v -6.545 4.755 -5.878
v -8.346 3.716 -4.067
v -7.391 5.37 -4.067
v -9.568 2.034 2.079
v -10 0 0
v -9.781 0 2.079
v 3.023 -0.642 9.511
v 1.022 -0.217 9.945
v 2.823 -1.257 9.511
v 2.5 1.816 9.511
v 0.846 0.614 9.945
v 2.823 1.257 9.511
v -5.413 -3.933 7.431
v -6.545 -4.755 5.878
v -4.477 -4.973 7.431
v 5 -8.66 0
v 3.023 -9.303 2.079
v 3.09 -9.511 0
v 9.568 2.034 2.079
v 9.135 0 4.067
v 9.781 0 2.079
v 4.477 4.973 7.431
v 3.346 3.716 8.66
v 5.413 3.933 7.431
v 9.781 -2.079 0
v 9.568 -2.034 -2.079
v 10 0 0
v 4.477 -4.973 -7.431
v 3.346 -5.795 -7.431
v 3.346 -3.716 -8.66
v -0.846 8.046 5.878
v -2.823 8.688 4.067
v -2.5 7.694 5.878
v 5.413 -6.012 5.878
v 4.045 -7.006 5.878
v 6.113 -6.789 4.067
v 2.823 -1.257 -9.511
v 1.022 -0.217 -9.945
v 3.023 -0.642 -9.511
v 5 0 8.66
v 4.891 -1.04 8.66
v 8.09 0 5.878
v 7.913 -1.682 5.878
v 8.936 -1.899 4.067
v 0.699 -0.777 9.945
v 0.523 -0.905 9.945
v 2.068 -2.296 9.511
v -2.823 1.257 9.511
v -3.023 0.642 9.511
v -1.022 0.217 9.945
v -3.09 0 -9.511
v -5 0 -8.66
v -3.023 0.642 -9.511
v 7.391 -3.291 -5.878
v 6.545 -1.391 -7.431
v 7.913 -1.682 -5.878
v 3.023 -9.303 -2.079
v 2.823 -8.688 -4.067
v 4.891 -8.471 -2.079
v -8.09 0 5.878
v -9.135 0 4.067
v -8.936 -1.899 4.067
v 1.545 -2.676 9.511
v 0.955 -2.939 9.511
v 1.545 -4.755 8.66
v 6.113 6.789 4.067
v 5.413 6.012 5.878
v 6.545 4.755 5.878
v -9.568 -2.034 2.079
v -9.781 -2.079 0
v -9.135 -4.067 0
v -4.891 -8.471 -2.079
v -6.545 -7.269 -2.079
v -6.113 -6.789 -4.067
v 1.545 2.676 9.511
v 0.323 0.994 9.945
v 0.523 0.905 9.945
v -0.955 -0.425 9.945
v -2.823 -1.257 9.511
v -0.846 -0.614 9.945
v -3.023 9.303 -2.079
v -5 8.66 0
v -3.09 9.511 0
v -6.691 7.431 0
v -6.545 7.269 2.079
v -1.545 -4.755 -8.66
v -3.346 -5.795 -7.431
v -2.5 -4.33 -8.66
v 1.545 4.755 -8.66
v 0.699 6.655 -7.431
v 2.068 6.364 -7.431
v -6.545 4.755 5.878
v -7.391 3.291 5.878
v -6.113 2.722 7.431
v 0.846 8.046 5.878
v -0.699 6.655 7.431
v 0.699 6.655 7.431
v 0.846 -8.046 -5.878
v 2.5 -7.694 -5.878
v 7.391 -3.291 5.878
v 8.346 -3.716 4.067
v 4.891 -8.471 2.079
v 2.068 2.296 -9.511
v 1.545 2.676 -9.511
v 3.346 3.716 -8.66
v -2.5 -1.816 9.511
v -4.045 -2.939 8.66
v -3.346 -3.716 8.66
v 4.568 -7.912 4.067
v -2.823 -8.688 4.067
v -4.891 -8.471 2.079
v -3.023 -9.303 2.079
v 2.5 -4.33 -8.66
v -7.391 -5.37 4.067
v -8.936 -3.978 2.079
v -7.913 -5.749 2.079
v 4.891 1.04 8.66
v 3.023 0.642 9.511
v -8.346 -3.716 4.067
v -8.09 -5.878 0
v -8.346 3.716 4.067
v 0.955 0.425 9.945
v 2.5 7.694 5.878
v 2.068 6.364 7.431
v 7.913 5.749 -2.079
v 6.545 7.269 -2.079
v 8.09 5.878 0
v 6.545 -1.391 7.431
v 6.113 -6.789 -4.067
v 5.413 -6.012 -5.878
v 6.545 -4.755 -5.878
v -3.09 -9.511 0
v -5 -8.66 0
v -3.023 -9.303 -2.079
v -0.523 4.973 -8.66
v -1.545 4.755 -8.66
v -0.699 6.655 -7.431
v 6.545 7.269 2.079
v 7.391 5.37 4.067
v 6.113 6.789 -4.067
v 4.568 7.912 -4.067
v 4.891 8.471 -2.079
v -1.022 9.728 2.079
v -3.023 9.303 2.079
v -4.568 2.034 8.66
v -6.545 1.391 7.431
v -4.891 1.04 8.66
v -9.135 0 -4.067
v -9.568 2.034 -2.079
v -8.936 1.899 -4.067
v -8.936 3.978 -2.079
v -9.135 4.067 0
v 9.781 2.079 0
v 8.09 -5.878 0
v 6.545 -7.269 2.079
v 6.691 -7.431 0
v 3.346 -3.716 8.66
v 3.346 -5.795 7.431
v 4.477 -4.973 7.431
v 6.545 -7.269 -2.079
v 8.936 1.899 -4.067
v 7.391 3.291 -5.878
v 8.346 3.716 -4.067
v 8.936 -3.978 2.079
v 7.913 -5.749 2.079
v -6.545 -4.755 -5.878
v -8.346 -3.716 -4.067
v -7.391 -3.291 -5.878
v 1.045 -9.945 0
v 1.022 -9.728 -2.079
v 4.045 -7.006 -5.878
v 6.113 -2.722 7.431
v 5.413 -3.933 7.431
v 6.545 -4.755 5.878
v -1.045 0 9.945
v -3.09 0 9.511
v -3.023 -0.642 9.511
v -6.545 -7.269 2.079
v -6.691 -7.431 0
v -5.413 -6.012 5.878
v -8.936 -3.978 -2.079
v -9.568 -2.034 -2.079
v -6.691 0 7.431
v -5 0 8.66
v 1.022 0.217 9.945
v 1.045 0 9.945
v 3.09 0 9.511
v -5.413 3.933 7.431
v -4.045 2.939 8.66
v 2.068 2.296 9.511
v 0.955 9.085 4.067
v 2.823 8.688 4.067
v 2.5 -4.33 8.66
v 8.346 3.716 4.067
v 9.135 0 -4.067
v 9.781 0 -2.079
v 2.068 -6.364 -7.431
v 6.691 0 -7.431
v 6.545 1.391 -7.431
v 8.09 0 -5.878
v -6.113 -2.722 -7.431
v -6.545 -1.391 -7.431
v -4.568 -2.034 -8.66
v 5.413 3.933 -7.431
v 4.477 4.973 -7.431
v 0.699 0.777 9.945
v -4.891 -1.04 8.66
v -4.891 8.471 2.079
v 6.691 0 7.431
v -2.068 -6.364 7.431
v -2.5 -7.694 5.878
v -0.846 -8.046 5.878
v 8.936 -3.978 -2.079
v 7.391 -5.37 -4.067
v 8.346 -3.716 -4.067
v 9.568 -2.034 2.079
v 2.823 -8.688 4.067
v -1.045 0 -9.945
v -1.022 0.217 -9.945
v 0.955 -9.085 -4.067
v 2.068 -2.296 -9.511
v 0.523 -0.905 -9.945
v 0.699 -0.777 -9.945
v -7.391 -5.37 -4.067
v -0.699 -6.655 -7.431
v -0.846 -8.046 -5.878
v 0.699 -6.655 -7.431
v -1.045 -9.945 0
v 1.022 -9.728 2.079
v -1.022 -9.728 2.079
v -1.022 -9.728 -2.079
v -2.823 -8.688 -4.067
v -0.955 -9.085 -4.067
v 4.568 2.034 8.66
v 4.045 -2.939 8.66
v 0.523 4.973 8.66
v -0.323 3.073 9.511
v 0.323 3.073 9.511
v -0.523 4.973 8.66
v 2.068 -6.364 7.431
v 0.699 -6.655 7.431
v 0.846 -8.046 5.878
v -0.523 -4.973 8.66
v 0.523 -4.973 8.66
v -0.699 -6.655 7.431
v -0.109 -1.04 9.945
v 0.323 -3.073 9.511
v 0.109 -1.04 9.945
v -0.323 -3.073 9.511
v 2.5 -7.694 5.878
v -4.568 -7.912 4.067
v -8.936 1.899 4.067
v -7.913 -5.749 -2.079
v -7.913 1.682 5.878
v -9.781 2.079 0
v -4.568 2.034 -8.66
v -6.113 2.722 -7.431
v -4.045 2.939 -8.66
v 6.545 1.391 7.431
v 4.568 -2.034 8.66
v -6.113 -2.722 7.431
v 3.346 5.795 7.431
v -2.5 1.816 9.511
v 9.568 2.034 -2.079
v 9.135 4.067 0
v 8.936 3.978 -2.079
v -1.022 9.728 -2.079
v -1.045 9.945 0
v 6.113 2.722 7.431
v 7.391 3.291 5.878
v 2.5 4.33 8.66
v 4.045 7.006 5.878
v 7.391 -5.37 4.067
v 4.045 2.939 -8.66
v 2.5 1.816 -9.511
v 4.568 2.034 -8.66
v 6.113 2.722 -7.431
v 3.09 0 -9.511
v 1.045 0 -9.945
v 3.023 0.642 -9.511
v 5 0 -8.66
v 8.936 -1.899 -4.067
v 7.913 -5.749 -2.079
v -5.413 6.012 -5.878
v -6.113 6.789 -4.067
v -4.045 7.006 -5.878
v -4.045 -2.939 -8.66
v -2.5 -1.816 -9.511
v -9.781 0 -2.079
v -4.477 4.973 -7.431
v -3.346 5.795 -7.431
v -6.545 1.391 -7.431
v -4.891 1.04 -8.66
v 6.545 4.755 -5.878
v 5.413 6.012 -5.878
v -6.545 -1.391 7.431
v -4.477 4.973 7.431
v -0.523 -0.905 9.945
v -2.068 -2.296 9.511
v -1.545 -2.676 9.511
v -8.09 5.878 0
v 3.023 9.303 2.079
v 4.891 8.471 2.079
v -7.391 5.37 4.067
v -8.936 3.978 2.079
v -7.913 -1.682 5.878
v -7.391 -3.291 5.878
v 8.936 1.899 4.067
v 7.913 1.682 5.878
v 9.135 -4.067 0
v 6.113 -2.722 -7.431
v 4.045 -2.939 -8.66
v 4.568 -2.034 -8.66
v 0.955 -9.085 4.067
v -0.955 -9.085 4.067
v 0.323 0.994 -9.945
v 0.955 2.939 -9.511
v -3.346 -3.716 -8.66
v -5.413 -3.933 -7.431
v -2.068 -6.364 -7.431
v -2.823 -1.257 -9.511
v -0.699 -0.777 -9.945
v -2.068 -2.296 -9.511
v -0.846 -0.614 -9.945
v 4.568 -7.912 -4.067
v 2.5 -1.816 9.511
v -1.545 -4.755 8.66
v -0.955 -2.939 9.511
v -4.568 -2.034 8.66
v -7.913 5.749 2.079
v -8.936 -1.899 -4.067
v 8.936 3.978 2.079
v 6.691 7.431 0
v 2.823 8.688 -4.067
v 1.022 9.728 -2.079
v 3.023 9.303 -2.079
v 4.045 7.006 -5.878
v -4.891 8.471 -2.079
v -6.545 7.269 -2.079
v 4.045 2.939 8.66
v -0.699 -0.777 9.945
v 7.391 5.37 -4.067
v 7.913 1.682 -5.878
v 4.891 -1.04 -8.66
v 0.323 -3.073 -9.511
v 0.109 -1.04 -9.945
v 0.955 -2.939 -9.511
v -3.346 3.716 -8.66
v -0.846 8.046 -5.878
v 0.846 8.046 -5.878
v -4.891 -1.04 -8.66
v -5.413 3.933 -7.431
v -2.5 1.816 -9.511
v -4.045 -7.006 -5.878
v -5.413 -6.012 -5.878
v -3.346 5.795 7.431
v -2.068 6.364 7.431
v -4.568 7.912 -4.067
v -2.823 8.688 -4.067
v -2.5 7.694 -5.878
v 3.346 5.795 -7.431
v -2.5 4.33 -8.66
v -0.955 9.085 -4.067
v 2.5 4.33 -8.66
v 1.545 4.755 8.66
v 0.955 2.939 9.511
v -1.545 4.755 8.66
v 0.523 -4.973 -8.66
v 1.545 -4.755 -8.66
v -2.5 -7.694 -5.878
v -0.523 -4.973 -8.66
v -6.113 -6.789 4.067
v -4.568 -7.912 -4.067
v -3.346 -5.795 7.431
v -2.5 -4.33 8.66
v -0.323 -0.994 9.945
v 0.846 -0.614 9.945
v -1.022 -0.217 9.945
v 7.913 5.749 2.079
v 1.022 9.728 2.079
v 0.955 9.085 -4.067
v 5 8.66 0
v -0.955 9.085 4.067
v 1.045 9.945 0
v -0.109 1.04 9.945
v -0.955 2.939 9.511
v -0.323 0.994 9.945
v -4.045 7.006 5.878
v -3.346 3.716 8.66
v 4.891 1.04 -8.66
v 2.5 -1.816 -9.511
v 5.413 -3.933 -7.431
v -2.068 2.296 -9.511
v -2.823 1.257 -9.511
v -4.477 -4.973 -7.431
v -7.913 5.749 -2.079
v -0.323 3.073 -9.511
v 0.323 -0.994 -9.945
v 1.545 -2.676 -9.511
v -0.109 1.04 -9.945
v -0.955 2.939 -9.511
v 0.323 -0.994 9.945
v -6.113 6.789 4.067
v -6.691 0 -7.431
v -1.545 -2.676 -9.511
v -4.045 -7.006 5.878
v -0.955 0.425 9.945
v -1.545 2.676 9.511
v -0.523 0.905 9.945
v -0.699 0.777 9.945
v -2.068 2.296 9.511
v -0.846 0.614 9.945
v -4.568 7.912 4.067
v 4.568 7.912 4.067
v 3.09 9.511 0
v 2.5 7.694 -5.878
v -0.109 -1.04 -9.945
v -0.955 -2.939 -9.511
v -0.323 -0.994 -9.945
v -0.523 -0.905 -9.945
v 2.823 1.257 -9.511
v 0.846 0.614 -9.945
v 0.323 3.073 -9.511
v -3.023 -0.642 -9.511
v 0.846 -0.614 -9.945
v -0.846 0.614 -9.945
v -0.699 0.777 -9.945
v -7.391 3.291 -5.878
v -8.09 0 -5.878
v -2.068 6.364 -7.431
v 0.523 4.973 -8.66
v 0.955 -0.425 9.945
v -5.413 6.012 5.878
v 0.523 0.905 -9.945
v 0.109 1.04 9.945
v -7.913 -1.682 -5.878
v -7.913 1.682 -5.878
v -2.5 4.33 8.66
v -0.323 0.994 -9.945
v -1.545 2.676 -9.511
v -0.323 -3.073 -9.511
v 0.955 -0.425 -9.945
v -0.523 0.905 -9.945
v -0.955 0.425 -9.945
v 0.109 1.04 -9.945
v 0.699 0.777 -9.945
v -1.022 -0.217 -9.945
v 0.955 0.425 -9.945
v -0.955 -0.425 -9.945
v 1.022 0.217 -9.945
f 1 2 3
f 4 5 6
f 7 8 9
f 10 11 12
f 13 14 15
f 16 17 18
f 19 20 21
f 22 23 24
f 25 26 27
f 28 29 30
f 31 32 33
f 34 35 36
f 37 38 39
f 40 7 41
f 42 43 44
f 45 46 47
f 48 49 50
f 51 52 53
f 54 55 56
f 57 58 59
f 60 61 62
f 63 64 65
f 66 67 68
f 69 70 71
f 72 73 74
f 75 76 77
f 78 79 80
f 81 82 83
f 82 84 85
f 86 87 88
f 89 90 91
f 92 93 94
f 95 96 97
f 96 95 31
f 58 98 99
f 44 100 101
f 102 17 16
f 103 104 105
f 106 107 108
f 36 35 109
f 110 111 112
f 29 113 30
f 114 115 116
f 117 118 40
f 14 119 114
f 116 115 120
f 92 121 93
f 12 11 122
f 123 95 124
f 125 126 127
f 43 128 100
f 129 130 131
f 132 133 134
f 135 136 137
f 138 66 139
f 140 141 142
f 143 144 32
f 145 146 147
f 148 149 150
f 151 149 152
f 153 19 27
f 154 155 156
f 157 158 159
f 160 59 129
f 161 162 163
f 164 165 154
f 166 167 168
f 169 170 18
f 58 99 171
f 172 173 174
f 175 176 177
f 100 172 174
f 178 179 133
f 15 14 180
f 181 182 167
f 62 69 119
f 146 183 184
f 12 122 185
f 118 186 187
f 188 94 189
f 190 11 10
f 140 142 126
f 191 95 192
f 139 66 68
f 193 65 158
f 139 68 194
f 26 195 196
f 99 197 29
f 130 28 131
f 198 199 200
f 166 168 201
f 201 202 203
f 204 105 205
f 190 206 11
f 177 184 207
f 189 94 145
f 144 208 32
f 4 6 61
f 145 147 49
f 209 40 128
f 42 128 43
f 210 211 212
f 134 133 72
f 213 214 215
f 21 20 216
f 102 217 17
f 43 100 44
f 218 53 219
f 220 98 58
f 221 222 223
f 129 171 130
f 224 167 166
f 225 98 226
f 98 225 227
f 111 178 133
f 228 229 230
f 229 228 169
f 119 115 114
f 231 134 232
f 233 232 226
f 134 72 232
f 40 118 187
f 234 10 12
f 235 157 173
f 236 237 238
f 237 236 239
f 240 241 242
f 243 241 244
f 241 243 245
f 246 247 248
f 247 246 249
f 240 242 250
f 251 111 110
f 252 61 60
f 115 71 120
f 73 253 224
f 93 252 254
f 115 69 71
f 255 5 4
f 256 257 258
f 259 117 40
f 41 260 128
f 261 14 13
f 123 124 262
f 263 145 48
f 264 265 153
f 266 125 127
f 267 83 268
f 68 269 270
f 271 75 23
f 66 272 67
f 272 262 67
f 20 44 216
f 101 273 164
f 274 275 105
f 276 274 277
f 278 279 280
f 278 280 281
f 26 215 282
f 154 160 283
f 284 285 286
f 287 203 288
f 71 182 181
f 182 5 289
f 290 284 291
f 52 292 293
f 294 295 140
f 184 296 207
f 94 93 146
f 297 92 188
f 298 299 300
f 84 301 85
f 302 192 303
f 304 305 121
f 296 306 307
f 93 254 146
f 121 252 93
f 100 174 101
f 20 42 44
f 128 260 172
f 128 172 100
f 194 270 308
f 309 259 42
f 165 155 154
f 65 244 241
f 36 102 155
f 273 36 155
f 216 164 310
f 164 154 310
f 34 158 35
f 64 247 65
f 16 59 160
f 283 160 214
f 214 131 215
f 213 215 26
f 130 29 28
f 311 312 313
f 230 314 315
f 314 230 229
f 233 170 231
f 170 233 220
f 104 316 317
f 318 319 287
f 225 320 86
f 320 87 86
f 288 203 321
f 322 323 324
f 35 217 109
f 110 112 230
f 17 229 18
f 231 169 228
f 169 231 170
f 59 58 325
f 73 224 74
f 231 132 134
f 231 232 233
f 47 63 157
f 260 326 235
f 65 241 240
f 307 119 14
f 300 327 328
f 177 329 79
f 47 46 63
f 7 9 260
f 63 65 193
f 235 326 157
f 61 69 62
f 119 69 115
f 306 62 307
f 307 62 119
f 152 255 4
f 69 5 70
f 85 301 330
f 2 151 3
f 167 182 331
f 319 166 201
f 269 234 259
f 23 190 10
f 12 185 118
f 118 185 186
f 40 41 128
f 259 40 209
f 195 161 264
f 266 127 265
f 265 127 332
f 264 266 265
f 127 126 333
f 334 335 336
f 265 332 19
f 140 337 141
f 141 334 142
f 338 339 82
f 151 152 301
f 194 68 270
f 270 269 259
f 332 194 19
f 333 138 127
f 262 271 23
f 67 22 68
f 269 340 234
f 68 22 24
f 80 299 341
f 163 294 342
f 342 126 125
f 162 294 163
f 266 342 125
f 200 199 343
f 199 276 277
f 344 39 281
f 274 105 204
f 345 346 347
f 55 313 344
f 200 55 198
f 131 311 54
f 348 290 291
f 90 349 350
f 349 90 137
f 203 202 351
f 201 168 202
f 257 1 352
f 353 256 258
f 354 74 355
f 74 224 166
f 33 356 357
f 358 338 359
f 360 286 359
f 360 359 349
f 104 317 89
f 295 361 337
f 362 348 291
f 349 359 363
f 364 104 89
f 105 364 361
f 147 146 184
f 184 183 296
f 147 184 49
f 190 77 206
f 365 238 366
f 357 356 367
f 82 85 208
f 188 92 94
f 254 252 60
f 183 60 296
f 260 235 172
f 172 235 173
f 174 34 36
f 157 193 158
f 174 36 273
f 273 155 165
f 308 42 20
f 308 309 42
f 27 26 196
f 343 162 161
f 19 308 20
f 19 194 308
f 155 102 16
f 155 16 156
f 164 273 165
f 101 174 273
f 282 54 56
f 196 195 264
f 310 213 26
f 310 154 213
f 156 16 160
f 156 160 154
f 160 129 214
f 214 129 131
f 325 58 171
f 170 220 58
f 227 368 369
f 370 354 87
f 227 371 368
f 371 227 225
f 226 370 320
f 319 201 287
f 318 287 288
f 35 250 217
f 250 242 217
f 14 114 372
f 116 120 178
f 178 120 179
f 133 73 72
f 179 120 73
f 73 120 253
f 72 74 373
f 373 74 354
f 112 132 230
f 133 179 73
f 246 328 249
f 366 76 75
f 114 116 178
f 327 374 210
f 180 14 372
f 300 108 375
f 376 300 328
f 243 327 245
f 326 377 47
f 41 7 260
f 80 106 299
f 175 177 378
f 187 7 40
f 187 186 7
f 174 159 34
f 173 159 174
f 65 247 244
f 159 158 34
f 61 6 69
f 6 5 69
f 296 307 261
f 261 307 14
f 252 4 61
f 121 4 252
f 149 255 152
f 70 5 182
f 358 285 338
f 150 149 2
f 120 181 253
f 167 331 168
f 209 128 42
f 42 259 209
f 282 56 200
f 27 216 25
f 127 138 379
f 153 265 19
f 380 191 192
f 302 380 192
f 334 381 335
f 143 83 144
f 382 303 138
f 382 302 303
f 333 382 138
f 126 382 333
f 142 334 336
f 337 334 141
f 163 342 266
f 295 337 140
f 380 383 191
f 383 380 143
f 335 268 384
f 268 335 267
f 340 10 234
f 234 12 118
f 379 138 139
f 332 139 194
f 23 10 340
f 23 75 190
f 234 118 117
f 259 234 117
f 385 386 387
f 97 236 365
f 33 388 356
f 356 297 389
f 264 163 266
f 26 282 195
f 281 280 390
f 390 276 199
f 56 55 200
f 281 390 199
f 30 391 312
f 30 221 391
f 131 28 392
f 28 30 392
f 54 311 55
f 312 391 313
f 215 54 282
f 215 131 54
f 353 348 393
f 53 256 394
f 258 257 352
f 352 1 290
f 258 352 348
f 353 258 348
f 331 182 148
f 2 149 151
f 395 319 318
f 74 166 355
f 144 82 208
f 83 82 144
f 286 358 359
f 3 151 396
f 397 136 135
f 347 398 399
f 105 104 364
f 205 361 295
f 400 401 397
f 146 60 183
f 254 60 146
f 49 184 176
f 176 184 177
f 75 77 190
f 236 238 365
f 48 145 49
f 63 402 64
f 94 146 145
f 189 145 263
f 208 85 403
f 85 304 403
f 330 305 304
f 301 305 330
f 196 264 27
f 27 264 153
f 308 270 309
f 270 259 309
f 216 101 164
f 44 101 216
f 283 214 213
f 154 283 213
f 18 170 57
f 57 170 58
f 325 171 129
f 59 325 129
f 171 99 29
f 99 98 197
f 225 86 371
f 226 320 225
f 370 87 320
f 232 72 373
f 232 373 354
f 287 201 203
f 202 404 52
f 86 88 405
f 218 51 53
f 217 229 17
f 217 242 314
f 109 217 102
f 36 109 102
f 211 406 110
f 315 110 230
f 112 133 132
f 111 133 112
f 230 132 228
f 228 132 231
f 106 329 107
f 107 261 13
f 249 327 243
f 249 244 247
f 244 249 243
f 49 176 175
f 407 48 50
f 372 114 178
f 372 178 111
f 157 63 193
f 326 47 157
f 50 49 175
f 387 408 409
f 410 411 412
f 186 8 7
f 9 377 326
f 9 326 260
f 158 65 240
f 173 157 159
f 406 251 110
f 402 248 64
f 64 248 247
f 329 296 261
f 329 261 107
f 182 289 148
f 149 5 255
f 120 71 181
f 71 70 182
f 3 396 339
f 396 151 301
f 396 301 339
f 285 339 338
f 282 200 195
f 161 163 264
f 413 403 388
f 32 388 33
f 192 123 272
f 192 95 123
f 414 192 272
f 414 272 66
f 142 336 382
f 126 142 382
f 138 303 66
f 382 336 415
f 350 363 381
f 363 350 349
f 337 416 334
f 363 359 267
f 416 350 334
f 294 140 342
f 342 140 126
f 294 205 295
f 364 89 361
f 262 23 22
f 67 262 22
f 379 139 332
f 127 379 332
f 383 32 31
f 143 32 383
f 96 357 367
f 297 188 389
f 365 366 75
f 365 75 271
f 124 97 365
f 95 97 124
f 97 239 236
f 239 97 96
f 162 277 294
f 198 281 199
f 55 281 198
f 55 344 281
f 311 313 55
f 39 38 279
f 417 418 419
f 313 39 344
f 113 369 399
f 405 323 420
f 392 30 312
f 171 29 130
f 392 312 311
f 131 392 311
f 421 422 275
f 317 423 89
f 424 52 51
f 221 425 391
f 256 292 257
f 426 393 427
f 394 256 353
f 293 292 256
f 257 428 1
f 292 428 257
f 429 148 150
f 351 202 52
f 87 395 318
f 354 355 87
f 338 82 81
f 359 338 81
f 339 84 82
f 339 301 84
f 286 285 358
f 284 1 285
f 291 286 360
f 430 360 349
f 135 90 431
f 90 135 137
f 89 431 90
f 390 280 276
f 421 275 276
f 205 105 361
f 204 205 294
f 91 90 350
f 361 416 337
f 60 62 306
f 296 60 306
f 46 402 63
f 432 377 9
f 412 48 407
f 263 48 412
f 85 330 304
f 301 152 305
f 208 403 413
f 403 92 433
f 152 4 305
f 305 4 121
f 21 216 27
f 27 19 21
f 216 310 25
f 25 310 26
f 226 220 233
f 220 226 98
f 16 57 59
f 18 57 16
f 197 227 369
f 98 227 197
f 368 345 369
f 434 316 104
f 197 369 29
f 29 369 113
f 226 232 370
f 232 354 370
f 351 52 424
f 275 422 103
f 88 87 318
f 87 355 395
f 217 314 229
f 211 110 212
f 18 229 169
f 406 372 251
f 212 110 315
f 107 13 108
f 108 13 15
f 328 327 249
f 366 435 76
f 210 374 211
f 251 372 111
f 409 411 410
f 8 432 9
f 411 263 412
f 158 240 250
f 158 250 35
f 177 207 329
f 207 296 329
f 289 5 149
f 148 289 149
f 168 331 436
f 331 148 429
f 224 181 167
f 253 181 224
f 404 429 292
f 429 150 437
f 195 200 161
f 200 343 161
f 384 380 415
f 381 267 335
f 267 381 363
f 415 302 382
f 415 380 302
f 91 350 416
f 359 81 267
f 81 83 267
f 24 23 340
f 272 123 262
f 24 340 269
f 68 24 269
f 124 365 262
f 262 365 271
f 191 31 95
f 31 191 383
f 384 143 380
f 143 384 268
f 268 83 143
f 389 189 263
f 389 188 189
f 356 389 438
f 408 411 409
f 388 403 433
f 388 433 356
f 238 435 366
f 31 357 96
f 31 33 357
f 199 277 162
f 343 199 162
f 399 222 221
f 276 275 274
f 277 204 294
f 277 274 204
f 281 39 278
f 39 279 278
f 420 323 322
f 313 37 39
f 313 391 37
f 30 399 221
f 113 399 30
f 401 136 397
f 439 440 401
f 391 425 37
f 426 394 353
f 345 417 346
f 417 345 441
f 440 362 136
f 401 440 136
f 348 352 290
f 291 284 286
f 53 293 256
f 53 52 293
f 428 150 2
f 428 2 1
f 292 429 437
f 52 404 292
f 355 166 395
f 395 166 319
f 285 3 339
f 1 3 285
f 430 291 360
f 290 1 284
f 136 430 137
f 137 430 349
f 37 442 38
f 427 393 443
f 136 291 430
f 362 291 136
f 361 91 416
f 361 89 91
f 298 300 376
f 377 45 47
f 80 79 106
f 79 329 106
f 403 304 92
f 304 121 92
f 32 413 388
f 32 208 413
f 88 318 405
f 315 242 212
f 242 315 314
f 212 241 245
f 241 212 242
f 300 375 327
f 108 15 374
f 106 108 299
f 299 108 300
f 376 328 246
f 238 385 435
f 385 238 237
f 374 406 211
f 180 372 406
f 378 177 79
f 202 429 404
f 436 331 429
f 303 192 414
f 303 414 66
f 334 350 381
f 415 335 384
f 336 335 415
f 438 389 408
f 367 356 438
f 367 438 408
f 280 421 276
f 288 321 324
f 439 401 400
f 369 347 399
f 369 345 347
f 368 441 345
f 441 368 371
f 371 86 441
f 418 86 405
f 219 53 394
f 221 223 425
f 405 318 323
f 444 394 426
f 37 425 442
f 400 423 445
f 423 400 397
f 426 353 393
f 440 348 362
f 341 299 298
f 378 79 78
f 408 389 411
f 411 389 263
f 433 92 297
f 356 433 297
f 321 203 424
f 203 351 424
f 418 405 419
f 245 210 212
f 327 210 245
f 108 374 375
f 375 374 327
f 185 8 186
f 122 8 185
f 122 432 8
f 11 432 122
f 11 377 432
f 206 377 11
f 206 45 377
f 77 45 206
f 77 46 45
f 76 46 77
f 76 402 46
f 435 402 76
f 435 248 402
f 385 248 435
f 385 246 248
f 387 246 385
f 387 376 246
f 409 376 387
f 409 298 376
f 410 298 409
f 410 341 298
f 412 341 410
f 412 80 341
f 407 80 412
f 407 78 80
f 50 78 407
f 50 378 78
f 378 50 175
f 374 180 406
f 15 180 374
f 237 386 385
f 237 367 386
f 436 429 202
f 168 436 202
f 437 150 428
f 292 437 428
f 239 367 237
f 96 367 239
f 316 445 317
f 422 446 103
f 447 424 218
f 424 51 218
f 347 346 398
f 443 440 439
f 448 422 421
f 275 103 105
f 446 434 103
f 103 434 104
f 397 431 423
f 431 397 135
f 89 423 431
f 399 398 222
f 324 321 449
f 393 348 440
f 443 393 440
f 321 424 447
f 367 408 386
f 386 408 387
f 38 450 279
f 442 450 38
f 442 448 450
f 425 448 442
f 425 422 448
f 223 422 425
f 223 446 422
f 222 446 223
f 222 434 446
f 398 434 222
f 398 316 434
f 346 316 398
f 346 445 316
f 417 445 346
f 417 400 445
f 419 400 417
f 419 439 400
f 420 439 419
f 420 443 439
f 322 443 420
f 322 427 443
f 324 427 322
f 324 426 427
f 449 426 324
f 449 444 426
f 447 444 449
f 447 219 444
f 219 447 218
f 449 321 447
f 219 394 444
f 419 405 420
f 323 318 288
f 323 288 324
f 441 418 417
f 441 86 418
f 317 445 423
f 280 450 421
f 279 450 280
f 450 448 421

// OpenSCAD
// Test let-binding
module test_let() {
    let (a = 5, b = 10) {
        cube(a);
        sphere(b);
    }
}
test_let();
